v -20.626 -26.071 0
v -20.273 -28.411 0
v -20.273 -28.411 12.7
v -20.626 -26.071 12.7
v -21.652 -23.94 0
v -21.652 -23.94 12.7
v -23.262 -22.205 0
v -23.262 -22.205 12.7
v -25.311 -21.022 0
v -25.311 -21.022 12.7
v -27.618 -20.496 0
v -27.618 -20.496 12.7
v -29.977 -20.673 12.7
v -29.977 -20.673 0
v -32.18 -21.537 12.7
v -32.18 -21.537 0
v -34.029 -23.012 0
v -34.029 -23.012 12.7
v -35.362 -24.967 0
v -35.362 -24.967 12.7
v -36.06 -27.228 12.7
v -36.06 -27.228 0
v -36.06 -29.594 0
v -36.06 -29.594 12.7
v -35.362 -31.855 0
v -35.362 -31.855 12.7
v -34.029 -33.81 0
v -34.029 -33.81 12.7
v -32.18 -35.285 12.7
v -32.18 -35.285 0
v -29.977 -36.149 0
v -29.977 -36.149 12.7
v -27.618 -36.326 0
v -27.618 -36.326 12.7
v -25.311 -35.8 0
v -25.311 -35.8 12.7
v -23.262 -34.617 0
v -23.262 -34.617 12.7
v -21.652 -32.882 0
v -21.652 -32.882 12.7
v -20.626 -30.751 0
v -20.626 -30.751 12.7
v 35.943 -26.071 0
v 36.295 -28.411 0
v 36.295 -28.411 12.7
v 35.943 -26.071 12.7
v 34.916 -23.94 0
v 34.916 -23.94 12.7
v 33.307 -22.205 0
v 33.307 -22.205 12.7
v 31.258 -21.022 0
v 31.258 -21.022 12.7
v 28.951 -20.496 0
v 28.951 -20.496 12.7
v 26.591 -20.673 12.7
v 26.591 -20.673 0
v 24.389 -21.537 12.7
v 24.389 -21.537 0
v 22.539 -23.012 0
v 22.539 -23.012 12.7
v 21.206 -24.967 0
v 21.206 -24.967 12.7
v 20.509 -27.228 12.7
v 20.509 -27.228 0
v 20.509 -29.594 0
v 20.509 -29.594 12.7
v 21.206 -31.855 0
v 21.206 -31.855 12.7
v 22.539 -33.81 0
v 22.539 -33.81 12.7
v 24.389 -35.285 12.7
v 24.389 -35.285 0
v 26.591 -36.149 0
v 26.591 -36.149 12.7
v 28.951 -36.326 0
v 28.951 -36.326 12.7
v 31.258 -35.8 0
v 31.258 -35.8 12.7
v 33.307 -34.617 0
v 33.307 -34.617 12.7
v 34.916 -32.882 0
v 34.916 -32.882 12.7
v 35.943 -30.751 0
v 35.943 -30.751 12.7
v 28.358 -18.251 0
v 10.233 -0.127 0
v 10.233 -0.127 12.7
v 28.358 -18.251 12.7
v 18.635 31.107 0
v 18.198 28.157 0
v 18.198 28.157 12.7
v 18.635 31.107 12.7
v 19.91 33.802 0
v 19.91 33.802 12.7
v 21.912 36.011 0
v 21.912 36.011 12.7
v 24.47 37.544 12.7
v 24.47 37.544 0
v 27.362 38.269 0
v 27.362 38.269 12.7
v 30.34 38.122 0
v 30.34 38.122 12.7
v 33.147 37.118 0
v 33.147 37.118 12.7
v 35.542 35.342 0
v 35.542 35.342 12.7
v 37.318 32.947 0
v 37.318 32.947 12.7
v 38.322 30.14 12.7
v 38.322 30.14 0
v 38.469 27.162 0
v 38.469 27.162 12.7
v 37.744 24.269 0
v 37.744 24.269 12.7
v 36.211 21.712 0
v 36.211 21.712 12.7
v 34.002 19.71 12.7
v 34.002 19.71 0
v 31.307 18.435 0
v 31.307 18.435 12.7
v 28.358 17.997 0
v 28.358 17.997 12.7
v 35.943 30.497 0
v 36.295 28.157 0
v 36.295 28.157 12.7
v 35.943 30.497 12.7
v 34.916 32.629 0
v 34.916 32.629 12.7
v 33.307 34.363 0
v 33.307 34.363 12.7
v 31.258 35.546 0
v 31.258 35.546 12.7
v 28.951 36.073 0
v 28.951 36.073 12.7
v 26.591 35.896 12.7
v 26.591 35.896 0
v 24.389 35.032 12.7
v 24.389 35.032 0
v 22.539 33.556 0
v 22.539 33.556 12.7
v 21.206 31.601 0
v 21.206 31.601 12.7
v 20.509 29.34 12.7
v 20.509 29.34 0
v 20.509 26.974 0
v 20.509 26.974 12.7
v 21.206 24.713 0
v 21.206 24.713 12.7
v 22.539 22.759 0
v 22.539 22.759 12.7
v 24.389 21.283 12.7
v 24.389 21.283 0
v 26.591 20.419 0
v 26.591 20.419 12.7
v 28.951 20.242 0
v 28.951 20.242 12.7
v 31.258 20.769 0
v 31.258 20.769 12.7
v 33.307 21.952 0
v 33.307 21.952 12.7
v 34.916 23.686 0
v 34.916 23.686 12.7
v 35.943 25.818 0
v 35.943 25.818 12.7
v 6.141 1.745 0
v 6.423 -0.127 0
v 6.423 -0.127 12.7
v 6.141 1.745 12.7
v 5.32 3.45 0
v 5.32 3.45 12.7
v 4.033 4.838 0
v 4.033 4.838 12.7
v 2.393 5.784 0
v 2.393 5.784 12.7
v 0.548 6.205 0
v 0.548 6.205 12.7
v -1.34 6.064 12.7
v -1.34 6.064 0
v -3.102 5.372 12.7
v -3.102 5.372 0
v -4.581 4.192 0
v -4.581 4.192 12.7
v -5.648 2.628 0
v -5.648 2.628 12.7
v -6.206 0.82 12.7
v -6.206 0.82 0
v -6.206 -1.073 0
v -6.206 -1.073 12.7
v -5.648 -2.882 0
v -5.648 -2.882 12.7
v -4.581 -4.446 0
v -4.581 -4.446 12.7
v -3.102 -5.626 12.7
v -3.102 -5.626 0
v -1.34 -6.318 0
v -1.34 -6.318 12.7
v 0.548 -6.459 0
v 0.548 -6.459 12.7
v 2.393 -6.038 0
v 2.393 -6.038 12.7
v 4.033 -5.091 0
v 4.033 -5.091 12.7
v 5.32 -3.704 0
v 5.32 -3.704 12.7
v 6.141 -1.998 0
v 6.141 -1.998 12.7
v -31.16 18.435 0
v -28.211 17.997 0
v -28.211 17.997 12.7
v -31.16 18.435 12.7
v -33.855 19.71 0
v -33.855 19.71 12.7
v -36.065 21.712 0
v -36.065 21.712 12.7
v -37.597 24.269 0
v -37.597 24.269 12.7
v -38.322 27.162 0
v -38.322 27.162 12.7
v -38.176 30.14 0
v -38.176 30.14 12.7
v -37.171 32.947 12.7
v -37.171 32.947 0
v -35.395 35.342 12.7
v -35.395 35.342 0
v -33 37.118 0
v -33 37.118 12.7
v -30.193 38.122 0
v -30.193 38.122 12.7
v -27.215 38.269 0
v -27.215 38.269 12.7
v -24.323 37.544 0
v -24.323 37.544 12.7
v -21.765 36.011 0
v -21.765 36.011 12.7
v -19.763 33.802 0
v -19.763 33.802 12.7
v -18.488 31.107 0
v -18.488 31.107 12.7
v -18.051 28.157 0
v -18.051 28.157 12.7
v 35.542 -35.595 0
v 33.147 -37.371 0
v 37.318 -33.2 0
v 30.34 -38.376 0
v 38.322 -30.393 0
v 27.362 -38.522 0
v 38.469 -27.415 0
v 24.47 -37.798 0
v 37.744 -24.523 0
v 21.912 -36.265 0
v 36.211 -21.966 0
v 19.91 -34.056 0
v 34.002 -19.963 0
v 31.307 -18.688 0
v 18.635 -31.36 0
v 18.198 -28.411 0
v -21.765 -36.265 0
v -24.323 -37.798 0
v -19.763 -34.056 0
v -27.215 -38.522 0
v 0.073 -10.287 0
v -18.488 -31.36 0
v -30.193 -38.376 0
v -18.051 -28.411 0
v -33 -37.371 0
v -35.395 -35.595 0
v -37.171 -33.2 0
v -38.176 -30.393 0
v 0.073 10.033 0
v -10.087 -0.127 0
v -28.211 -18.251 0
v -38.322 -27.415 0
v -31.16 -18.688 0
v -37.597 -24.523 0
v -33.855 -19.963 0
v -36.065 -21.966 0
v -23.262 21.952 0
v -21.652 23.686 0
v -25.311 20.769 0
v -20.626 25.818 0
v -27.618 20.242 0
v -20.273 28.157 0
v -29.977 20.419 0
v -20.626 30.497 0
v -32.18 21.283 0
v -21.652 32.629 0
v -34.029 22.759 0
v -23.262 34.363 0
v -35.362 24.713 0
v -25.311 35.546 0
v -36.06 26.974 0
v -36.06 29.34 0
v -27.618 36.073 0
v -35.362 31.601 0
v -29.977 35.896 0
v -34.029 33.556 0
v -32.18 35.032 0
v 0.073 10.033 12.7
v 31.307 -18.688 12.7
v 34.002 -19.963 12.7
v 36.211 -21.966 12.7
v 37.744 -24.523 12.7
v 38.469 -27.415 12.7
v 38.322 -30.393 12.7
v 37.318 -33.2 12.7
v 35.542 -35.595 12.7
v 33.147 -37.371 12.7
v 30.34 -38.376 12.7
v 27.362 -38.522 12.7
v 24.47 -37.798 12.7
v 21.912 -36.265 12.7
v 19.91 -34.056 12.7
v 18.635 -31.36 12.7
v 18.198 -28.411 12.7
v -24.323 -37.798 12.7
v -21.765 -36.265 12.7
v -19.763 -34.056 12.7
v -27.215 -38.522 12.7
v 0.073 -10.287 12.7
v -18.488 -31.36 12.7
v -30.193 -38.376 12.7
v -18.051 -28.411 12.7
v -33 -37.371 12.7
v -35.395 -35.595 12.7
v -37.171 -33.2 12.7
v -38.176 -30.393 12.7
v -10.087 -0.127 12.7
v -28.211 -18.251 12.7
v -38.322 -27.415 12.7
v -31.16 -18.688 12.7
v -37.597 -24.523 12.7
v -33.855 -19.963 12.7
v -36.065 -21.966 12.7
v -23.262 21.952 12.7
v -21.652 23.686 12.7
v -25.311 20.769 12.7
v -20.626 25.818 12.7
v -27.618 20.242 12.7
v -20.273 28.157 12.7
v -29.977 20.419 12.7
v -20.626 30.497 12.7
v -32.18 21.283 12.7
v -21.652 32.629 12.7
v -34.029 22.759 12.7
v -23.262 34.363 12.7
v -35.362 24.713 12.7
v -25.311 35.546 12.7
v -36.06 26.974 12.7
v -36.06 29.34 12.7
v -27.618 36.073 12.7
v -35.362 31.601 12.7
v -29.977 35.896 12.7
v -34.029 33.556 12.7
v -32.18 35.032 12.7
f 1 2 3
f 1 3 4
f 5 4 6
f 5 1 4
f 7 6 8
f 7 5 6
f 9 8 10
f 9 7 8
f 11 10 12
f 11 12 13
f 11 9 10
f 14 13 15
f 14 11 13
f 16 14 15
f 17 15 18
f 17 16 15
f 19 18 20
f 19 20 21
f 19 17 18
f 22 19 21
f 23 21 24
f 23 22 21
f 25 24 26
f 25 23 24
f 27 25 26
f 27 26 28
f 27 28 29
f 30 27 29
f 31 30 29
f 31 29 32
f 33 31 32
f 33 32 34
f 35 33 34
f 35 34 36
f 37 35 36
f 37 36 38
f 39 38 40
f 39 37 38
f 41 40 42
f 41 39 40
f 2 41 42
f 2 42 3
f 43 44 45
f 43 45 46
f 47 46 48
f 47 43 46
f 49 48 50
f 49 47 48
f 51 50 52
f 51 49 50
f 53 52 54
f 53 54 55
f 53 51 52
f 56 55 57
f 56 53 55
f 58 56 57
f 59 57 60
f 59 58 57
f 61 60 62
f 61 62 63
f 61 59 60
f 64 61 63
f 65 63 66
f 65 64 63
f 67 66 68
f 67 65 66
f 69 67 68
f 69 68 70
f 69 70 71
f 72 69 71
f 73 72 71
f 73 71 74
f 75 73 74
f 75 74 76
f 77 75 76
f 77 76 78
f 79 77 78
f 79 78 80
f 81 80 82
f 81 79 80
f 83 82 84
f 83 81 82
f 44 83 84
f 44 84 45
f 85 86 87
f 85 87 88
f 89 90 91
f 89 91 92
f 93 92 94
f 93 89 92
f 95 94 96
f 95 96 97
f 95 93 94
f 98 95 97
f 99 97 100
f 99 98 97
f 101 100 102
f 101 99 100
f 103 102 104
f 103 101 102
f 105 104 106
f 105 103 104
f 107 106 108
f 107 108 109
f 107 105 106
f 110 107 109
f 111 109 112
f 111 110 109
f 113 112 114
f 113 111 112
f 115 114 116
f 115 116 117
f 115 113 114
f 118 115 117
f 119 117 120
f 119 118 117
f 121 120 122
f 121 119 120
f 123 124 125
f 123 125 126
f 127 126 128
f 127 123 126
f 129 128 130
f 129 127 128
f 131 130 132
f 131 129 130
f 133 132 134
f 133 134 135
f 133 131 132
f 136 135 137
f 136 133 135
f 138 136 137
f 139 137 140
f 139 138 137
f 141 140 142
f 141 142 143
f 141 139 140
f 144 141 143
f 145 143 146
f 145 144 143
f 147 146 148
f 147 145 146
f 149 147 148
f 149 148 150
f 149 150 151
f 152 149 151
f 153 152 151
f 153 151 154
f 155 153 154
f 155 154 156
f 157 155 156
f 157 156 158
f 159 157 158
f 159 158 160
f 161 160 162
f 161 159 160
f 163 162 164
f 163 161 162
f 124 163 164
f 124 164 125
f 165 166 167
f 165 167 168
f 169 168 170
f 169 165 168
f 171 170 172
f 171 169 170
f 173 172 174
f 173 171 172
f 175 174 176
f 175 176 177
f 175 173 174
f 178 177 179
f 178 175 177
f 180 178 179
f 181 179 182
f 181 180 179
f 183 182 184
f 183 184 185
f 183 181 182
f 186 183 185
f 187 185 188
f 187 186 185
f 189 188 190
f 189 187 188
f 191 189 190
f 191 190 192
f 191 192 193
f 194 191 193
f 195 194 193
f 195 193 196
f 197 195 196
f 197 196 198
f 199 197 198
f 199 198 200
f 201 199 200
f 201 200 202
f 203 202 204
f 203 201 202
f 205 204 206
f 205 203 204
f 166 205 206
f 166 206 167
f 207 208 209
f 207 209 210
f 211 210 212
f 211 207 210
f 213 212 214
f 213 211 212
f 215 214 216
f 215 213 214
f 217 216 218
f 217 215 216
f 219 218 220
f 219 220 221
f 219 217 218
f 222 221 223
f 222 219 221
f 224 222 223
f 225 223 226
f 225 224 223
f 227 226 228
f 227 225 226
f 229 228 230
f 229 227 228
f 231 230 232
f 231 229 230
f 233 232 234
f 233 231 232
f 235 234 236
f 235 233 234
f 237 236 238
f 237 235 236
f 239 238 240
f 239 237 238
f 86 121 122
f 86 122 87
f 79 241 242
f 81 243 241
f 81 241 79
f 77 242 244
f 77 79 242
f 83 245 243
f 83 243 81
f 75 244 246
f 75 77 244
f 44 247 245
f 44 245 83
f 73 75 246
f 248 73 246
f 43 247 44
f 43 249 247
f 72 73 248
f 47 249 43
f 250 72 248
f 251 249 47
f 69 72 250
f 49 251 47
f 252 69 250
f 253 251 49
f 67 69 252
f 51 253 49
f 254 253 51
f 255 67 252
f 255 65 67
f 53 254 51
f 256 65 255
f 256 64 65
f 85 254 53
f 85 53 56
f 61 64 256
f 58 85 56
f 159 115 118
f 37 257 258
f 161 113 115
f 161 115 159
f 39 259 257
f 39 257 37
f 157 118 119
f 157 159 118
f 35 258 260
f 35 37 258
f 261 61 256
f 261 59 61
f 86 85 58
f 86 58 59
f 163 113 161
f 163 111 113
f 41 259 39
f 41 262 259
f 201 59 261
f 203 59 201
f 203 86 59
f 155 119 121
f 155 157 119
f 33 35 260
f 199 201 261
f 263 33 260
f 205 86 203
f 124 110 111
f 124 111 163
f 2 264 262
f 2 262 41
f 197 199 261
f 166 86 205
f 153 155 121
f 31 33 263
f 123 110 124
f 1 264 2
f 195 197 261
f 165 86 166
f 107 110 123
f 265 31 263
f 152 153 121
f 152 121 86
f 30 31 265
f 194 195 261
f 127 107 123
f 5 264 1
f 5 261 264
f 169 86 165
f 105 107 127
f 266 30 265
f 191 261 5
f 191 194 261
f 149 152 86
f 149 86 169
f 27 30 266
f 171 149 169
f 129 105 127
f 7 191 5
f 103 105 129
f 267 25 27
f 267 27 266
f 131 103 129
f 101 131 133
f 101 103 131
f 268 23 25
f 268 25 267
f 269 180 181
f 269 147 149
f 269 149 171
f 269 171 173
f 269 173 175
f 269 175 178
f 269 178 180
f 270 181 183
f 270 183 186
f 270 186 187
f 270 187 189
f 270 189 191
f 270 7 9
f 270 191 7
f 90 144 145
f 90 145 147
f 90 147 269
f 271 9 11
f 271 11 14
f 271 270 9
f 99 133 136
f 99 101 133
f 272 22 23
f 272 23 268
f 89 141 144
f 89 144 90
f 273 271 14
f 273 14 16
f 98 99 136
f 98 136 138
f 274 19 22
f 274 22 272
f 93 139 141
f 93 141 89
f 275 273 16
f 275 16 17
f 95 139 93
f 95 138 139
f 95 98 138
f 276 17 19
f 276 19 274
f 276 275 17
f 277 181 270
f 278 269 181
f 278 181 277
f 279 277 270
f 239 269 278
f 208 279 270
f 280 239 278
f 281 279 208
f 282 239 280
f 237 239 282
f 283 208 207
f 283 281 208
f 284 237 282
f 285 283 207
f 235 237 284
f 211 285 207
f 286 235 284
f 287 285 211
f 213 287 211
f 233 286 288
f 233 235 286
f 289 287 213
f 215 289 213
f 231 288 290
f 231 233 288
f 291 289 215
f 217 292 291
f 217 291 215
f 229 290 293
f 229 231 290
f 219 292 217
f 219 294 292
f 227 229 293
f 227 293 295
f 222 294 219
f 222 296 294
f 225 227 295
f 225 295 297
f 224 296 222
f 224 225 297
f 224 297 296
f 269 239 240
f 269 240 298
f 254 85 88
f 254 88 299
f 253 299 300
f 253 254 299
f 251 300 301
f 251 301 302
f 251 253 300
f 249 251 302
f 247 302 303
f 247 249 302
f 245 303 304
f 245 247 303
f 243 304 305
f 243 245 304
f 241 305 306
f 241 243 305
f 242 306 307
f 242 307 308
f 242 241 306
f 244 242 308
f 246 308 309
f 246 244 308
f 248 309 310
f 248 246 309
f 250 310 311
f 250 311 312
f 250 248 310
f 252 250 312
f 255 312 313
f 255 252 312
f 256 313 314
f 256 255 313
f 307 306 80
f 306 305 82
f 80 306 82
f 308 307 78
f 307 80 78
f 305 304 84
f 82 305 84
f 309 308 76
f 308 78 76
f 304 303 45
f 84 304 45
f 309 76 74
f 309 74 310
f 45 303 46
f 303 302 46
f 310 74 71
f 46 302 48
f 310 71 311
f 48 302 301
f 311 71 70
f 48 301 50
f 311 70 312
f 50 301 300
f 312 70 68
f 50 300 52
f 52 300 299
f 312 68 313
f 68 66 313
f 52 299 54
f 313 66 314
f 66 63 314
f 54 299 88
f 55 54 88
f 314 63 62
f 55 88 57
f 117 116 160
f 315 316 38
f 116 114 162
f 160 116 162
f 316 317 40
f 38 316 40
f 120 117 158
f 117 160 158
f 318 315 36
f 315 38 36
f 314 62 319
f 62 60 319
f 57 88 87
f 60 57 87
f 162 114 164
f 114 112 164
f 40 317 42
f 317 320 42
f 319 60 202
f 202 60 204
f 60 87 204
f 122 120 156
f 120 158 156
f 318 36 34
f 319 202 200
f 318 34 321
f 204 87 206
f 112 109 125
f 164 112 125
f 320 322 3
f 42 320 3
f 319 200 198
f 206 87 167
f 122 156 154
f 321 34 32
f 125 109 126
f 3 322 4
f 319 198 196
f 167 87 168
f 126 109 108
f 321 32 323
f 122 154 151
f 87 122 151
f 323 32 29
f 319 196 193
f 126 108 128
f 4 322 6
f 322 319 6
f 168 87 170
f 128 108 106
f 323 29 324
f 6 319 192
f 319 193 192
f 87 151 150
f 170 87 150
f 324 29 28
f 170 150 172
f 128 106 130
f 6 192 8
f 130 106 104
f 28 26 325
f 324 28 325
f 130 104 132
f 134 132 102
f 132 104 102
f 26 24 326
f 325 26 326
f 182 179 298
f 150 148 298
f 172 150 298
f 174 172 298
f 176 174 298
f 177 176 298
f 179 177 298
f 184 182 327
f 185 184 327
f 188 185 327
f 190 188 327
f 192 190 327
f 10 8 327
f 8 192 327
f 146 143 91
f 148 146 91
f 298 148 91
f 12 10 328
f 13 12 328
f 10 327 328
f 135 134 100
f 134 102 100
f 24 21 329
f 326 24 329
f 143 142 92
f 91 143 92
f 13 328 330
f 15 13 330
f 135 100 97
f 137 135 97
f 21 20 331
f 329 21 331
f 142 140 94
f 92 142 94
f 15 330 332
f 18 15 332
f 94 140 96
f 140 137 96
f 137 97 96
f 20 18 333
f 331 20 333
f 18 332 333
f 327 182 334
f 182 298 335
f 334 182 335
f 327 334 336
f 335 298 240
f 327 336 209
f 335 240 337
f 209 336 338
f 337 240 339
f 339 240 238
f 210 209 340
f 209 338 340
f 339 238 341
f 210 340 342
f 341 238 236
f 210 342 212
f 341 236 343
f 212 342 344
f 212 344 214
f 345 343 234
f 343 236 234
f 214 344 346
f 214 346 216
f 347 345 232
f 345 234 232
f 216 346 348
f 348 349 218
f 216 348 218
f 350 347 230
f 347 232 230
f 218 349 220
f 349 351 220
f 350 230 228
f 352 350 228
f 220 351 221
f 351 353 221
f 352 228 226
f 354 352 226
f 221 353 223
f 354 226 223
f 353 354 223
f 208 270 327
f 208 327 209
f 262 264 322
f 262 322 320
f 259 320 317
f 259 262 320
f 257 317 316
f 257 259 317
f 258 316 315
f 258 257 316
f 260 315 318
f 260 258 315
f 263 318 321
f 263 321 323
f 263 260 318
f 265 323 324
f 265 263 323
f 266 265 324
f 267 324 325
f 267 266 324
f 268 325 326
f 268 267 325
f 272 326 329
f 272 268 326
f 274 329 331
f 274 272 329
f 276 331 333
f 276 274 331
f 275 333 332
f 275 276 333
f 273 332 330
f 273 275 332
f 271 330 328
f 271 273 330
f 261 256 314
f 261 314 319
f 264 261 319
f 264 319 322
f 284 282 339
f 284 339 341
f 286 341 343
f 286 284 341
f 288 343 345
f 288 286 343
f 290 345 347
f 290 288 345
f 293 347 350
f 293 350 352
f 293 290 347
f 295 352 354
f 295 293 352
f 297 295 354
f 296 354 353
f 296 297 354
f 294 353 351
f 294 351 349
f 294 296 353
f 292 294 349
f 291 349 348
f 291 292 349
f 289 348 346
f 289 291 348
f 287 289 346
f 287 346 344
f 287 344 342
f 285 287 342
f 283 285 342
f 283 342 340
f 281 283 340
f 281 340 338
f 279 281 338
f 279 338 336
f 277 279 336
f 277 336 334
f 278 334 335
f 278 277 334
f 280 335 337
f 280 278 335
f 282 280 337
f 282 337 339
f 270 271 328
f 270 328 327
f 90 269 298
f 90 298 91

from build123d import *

# Parameters (mm, degrees)
SKETCH2_R           = 7.9375
SKETCH2_R_2         = 6.35
BOSS_EXTRUDE1_DEPTH = 12.7


with BuildPart() as part:
    # Sketch2 → Boss-Extrude1 (new body)
    with BuildSketch(Plane.XY):
        with BuildLine():
            Line((-28.210760469, -18.251004821), (-10.08654579, -0.126790143))
            Line((-10.08654579, -0.126790143), (-28.210760469, 17.997424536))
            ThreePointArc((-28.210760469, 17.997424536), (-35.394965366, 35.341629433), (-18.050760469, 28.157424536))
            Line((-18.050760469, 28.157424536), (0.07345421, 10.033209857))
            Line((0.07345421, 10.033209857), (18.197668889, 28.157424536))
            ThreePointArc((18.197668889, 28.157424536), (35.541873785, 35.341629433), (28.357668889, 17.997424536))
            Line((28.357668889, 17.997424536), (10.23345421, -0.126790143))
            Line((10.23345421, -0.126790143), (28.357668889, -18.251004821))
            ThreePointArc((28.357668889, -18.251004821), (35.541873785, -35.595209718), (18.197668889, -28.411004821))
            Line((18.197668889, -28.411004821), (0.07345421, -10.286790143))
            Line((0.07345421, -10.286790143), (-18.050760469, -28.411004821))
            ThreePointArc((-18.050760469, -28.411004821), (-35.394965366, -35.595209718), (-28.210760469, -18.251004821))
        make_face()
        with Locations((-28.210760469, 28.157424536)):
            Circle(SKETCH2_R, mode=Mode.SUBTRACT)
        with Locations((28.357668889, 28.157424536)):
            Circle(SKETCH2_R, mode=Mode.SUBTRACT)
        with Locations((28.357668889, -28.411004821)):
            Circle(SKETCH2_R, mode=Mode.SUBTRACT)
        with Locations((-28.210760469, -28.411004821)):
            Circle(SKETCH2_R, mode=Mode.SUBTRACT)
        with Locations((0.07345421, -0.126790143)):
            Circle(SKETCH2_R_2, mode=Mode.SUBTRACT)
    extrude(amount=BOSS_EXTRUDE1_DEPTH)


solid = part.part
